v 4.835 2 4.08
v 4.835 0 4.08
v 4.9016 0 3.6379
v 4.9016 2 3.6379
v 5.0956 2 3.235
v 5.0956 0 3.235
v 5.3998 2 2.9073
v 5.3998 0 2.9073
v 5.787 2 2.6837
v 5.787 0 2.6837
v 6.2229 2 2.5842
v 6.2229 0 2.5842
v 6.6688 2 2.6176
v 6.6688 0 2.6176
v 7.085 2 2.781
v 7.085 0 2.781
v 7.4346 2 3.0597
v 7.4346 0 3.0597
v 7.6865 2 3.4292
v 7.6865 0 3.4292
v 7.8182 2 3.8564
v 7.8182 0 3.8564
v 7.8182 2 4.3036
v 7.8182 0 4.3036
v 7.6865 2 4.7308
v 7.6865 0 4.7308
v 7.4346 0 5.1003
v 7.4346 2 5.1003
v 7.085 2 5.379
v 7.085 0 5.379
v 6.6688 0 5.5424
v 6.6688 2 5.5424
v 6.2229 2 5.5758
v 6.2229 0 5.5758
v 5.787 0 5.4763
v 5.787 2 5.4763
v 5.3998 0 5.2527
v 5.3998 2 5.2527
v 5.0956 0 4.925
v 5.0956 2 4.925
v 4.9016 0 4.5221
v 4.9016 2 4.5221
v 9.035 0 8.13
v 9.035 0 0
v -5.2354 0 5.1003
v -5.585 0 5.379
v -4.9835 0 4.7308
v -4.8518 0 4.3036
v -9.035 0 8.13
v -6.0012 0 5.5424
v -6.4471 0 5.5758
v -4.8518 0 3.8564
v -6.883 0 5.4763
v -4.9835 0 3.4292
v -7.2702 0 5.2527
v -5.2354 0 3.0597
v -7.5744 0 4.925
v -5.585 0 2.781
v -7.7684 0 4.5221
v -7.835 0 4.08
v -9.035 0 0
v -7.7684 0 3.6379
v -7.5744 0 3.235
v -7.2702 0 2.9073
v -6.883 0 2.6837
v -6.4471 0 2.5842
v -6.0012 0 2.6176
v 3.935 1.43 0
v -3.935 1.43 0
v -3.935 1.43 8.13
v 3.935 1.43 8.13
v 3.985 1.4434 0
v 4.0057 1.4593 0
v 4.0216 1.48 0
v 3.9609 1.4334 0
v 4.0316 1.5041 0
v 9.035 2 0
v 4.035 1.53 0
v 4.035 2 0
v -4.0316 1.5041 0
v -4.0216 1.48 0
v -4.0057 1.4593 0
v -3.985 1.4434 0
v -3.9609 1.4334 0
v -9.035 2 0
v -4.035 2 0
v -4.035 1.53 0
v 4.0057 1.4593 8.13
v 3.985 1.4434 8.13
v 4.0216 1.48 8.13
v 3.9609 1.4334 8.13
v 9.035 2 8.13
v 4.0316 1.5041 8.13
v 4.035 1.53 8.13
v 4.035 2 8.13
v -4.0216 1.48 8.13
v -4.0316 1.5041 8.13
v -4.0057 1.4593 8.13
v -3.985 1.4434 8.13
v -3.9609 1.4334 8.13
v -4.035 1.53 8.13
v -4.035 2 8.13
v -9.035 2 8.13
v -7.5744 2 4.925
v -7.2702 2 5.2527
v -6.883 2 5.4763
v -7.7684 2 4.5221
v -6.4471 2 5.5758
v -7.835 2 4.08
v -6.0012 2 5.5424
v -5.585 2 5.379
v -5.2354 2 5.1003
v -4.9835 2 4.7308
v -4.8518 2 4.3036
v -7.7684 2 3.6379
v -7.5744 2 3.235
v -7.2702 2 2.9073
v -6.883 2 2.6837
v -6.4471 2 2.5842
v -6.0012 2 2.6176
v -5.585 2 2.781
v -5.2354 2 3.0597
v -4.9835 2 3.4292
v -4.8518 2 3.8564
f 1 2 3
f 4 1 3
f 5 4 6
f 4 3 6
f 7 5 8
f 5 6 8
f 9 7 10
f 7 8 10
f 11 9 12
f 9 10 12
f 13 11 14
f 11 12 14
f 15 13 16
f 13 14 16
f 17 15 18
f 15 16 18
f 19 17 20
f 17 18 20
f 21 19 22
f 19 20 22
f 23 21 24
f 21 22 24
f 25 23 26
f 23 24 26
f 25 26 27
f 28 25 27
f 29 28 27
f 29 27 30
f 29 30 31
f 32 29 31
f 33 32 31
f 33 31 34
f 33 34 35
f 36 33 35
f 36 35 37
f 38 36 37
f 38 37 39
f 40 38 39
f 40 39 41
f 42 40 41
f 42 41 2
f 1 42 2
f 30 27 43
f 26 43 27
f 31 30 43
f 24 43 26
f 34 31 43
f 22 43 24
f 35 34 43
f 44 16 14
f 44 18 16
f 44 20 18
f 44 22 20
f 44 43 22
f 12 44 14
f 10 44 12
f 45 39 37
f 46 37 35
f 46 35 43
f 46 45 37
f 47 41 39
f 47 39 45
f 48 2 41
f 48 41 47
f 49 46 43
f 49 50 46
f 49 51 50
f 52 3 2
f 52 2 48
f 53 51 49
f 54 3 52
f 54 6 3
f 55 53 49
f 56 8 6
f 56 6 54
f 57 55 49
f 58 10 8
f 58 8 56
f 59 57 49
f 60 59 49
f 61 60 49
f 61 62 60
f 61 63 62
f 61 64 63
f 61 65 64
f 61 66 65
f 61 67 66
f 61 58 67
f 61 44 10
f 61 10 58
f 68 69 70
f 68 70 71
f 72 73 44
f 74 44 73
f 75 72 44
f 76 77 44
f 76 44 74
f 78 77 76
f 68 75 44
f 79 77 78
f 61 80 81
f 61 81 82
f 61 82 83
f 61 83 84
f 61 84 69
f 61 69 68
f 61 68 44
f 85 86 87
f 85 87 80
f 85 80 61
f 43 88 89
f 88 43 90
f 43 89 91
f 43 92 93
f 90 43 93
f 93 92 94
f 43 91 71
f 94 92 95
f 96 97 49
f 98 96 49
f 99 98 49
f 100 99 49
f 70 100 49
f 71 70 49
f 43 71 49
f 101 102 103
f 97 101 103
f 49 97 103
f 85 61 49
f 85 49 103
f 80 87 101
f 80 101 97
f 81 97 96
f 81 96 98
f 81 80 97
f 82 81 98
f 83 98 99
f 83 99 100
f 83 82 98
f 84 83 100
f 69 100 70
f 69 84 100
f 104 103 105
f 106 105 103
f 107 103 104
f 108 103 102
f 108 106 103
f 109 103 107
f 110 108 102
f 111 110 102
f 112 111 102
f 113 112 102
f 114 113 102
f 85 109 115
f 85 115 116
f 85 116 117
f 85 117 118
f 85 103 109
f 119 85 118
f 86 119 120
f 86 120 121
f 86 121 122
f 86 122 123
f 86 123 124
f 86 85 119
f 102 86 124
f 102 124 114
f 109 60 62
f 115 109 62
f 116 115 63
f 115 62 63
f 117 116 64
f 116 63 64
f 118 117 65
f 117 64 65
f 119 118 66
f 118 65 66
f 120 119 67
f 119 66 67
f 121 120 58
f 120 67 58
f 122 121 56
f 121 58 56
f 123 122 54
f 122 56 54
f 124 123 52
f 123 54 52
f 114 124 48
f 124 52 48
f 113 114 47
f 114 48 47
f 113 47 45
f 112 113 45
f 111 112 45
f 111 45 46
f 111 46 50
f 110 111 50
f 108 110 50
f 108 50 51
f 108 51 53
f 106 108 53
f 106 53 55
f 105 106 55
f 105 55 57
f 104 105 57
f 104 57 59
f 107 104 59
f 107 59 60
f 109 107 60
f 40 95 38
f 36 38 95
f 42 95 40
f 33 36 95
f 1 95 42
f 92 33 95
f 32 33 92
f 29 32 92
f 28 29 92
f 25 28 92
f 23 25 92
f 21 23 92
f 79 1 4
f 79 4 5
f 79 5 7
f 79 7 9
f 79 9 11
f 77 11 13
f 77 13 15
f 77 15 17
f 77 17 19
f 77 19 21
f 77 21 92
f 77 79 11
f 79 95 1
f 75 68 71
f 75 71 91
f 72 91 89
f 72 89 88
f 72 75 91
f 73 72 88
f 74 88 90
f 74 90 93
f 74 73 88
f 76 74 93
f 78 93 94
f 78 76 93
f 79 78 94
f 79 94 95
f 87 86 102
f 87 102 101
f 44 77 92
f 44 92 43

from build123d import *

# Parameters (mm, degrees)
BOSS_EXTRUDE1_DEPTH       = 8.13
F_3_0MM_DOWEL_HOLE1_D     = 3
F_3_0MM_DOWEL_HOLE1_DEPTH = 35
F_3_0MM_DOWEL_HOLE1_TIP   = 0.901290929


with BuildPart() as part:
    # Sketch1 → Boss-Extrude1 (new body)
    with BuildSketch(Plane.XY):
        with BuildLine():
            Line((-9.035, 0), (-9.035, 2))
            Line((-9.035, 2), (-4.035, 2))
            Line((-4.035, 2), (-4.035, 1.53))
            ThreePointArc((-4.035, 1.53), (-4.005710678, 1.459289322), (-3.935, 1.43))
            Line((-3.935, 1.43), (3.935, 1.43))
            ThreePointArc((3.935, 1.43), (4.005710678, 1.459289322), (4.035, 1.53))
            Line((4.035, 1.53), (4.035, 2))
            Line((4.035, 2), (9.035, 2))
            Line((9.035, 2), (9.035, 0))
            Line((9.035, 0), (-9.035, 0))
        make_face()
    extrude(amount=BOSS_EXTRUDE1_DEPTH)

    # Ø3.0mm Dowel Hole1
    with Locations(Plane(origin=(0, 2, 0), x_dir=(1, 0, 0), z_dir=(0, 1, 0))):
        with Locations((6.335, -4.08), (-6.335, -4.08)):
            Hole(F_3_0MM_DOWEL_HOLE1_D / 2, depth=F_3_0MM_DOWEL_HOLE1_DEPTH)
            with Locations((0, 0, -(F_3_0MM_DOWEL_HOLE1_DEPTH + F_3_0MM_DOWEL_HOLE1_TIP / 2))):  # 118° drill point
                Cone(0, F_3_0MM_DOWEL_HOLE1_D / 2, F_3_0MM_DOWEL_HOLE1_TIP, mode=Mode.SUBTRACT)


solid = part.part
